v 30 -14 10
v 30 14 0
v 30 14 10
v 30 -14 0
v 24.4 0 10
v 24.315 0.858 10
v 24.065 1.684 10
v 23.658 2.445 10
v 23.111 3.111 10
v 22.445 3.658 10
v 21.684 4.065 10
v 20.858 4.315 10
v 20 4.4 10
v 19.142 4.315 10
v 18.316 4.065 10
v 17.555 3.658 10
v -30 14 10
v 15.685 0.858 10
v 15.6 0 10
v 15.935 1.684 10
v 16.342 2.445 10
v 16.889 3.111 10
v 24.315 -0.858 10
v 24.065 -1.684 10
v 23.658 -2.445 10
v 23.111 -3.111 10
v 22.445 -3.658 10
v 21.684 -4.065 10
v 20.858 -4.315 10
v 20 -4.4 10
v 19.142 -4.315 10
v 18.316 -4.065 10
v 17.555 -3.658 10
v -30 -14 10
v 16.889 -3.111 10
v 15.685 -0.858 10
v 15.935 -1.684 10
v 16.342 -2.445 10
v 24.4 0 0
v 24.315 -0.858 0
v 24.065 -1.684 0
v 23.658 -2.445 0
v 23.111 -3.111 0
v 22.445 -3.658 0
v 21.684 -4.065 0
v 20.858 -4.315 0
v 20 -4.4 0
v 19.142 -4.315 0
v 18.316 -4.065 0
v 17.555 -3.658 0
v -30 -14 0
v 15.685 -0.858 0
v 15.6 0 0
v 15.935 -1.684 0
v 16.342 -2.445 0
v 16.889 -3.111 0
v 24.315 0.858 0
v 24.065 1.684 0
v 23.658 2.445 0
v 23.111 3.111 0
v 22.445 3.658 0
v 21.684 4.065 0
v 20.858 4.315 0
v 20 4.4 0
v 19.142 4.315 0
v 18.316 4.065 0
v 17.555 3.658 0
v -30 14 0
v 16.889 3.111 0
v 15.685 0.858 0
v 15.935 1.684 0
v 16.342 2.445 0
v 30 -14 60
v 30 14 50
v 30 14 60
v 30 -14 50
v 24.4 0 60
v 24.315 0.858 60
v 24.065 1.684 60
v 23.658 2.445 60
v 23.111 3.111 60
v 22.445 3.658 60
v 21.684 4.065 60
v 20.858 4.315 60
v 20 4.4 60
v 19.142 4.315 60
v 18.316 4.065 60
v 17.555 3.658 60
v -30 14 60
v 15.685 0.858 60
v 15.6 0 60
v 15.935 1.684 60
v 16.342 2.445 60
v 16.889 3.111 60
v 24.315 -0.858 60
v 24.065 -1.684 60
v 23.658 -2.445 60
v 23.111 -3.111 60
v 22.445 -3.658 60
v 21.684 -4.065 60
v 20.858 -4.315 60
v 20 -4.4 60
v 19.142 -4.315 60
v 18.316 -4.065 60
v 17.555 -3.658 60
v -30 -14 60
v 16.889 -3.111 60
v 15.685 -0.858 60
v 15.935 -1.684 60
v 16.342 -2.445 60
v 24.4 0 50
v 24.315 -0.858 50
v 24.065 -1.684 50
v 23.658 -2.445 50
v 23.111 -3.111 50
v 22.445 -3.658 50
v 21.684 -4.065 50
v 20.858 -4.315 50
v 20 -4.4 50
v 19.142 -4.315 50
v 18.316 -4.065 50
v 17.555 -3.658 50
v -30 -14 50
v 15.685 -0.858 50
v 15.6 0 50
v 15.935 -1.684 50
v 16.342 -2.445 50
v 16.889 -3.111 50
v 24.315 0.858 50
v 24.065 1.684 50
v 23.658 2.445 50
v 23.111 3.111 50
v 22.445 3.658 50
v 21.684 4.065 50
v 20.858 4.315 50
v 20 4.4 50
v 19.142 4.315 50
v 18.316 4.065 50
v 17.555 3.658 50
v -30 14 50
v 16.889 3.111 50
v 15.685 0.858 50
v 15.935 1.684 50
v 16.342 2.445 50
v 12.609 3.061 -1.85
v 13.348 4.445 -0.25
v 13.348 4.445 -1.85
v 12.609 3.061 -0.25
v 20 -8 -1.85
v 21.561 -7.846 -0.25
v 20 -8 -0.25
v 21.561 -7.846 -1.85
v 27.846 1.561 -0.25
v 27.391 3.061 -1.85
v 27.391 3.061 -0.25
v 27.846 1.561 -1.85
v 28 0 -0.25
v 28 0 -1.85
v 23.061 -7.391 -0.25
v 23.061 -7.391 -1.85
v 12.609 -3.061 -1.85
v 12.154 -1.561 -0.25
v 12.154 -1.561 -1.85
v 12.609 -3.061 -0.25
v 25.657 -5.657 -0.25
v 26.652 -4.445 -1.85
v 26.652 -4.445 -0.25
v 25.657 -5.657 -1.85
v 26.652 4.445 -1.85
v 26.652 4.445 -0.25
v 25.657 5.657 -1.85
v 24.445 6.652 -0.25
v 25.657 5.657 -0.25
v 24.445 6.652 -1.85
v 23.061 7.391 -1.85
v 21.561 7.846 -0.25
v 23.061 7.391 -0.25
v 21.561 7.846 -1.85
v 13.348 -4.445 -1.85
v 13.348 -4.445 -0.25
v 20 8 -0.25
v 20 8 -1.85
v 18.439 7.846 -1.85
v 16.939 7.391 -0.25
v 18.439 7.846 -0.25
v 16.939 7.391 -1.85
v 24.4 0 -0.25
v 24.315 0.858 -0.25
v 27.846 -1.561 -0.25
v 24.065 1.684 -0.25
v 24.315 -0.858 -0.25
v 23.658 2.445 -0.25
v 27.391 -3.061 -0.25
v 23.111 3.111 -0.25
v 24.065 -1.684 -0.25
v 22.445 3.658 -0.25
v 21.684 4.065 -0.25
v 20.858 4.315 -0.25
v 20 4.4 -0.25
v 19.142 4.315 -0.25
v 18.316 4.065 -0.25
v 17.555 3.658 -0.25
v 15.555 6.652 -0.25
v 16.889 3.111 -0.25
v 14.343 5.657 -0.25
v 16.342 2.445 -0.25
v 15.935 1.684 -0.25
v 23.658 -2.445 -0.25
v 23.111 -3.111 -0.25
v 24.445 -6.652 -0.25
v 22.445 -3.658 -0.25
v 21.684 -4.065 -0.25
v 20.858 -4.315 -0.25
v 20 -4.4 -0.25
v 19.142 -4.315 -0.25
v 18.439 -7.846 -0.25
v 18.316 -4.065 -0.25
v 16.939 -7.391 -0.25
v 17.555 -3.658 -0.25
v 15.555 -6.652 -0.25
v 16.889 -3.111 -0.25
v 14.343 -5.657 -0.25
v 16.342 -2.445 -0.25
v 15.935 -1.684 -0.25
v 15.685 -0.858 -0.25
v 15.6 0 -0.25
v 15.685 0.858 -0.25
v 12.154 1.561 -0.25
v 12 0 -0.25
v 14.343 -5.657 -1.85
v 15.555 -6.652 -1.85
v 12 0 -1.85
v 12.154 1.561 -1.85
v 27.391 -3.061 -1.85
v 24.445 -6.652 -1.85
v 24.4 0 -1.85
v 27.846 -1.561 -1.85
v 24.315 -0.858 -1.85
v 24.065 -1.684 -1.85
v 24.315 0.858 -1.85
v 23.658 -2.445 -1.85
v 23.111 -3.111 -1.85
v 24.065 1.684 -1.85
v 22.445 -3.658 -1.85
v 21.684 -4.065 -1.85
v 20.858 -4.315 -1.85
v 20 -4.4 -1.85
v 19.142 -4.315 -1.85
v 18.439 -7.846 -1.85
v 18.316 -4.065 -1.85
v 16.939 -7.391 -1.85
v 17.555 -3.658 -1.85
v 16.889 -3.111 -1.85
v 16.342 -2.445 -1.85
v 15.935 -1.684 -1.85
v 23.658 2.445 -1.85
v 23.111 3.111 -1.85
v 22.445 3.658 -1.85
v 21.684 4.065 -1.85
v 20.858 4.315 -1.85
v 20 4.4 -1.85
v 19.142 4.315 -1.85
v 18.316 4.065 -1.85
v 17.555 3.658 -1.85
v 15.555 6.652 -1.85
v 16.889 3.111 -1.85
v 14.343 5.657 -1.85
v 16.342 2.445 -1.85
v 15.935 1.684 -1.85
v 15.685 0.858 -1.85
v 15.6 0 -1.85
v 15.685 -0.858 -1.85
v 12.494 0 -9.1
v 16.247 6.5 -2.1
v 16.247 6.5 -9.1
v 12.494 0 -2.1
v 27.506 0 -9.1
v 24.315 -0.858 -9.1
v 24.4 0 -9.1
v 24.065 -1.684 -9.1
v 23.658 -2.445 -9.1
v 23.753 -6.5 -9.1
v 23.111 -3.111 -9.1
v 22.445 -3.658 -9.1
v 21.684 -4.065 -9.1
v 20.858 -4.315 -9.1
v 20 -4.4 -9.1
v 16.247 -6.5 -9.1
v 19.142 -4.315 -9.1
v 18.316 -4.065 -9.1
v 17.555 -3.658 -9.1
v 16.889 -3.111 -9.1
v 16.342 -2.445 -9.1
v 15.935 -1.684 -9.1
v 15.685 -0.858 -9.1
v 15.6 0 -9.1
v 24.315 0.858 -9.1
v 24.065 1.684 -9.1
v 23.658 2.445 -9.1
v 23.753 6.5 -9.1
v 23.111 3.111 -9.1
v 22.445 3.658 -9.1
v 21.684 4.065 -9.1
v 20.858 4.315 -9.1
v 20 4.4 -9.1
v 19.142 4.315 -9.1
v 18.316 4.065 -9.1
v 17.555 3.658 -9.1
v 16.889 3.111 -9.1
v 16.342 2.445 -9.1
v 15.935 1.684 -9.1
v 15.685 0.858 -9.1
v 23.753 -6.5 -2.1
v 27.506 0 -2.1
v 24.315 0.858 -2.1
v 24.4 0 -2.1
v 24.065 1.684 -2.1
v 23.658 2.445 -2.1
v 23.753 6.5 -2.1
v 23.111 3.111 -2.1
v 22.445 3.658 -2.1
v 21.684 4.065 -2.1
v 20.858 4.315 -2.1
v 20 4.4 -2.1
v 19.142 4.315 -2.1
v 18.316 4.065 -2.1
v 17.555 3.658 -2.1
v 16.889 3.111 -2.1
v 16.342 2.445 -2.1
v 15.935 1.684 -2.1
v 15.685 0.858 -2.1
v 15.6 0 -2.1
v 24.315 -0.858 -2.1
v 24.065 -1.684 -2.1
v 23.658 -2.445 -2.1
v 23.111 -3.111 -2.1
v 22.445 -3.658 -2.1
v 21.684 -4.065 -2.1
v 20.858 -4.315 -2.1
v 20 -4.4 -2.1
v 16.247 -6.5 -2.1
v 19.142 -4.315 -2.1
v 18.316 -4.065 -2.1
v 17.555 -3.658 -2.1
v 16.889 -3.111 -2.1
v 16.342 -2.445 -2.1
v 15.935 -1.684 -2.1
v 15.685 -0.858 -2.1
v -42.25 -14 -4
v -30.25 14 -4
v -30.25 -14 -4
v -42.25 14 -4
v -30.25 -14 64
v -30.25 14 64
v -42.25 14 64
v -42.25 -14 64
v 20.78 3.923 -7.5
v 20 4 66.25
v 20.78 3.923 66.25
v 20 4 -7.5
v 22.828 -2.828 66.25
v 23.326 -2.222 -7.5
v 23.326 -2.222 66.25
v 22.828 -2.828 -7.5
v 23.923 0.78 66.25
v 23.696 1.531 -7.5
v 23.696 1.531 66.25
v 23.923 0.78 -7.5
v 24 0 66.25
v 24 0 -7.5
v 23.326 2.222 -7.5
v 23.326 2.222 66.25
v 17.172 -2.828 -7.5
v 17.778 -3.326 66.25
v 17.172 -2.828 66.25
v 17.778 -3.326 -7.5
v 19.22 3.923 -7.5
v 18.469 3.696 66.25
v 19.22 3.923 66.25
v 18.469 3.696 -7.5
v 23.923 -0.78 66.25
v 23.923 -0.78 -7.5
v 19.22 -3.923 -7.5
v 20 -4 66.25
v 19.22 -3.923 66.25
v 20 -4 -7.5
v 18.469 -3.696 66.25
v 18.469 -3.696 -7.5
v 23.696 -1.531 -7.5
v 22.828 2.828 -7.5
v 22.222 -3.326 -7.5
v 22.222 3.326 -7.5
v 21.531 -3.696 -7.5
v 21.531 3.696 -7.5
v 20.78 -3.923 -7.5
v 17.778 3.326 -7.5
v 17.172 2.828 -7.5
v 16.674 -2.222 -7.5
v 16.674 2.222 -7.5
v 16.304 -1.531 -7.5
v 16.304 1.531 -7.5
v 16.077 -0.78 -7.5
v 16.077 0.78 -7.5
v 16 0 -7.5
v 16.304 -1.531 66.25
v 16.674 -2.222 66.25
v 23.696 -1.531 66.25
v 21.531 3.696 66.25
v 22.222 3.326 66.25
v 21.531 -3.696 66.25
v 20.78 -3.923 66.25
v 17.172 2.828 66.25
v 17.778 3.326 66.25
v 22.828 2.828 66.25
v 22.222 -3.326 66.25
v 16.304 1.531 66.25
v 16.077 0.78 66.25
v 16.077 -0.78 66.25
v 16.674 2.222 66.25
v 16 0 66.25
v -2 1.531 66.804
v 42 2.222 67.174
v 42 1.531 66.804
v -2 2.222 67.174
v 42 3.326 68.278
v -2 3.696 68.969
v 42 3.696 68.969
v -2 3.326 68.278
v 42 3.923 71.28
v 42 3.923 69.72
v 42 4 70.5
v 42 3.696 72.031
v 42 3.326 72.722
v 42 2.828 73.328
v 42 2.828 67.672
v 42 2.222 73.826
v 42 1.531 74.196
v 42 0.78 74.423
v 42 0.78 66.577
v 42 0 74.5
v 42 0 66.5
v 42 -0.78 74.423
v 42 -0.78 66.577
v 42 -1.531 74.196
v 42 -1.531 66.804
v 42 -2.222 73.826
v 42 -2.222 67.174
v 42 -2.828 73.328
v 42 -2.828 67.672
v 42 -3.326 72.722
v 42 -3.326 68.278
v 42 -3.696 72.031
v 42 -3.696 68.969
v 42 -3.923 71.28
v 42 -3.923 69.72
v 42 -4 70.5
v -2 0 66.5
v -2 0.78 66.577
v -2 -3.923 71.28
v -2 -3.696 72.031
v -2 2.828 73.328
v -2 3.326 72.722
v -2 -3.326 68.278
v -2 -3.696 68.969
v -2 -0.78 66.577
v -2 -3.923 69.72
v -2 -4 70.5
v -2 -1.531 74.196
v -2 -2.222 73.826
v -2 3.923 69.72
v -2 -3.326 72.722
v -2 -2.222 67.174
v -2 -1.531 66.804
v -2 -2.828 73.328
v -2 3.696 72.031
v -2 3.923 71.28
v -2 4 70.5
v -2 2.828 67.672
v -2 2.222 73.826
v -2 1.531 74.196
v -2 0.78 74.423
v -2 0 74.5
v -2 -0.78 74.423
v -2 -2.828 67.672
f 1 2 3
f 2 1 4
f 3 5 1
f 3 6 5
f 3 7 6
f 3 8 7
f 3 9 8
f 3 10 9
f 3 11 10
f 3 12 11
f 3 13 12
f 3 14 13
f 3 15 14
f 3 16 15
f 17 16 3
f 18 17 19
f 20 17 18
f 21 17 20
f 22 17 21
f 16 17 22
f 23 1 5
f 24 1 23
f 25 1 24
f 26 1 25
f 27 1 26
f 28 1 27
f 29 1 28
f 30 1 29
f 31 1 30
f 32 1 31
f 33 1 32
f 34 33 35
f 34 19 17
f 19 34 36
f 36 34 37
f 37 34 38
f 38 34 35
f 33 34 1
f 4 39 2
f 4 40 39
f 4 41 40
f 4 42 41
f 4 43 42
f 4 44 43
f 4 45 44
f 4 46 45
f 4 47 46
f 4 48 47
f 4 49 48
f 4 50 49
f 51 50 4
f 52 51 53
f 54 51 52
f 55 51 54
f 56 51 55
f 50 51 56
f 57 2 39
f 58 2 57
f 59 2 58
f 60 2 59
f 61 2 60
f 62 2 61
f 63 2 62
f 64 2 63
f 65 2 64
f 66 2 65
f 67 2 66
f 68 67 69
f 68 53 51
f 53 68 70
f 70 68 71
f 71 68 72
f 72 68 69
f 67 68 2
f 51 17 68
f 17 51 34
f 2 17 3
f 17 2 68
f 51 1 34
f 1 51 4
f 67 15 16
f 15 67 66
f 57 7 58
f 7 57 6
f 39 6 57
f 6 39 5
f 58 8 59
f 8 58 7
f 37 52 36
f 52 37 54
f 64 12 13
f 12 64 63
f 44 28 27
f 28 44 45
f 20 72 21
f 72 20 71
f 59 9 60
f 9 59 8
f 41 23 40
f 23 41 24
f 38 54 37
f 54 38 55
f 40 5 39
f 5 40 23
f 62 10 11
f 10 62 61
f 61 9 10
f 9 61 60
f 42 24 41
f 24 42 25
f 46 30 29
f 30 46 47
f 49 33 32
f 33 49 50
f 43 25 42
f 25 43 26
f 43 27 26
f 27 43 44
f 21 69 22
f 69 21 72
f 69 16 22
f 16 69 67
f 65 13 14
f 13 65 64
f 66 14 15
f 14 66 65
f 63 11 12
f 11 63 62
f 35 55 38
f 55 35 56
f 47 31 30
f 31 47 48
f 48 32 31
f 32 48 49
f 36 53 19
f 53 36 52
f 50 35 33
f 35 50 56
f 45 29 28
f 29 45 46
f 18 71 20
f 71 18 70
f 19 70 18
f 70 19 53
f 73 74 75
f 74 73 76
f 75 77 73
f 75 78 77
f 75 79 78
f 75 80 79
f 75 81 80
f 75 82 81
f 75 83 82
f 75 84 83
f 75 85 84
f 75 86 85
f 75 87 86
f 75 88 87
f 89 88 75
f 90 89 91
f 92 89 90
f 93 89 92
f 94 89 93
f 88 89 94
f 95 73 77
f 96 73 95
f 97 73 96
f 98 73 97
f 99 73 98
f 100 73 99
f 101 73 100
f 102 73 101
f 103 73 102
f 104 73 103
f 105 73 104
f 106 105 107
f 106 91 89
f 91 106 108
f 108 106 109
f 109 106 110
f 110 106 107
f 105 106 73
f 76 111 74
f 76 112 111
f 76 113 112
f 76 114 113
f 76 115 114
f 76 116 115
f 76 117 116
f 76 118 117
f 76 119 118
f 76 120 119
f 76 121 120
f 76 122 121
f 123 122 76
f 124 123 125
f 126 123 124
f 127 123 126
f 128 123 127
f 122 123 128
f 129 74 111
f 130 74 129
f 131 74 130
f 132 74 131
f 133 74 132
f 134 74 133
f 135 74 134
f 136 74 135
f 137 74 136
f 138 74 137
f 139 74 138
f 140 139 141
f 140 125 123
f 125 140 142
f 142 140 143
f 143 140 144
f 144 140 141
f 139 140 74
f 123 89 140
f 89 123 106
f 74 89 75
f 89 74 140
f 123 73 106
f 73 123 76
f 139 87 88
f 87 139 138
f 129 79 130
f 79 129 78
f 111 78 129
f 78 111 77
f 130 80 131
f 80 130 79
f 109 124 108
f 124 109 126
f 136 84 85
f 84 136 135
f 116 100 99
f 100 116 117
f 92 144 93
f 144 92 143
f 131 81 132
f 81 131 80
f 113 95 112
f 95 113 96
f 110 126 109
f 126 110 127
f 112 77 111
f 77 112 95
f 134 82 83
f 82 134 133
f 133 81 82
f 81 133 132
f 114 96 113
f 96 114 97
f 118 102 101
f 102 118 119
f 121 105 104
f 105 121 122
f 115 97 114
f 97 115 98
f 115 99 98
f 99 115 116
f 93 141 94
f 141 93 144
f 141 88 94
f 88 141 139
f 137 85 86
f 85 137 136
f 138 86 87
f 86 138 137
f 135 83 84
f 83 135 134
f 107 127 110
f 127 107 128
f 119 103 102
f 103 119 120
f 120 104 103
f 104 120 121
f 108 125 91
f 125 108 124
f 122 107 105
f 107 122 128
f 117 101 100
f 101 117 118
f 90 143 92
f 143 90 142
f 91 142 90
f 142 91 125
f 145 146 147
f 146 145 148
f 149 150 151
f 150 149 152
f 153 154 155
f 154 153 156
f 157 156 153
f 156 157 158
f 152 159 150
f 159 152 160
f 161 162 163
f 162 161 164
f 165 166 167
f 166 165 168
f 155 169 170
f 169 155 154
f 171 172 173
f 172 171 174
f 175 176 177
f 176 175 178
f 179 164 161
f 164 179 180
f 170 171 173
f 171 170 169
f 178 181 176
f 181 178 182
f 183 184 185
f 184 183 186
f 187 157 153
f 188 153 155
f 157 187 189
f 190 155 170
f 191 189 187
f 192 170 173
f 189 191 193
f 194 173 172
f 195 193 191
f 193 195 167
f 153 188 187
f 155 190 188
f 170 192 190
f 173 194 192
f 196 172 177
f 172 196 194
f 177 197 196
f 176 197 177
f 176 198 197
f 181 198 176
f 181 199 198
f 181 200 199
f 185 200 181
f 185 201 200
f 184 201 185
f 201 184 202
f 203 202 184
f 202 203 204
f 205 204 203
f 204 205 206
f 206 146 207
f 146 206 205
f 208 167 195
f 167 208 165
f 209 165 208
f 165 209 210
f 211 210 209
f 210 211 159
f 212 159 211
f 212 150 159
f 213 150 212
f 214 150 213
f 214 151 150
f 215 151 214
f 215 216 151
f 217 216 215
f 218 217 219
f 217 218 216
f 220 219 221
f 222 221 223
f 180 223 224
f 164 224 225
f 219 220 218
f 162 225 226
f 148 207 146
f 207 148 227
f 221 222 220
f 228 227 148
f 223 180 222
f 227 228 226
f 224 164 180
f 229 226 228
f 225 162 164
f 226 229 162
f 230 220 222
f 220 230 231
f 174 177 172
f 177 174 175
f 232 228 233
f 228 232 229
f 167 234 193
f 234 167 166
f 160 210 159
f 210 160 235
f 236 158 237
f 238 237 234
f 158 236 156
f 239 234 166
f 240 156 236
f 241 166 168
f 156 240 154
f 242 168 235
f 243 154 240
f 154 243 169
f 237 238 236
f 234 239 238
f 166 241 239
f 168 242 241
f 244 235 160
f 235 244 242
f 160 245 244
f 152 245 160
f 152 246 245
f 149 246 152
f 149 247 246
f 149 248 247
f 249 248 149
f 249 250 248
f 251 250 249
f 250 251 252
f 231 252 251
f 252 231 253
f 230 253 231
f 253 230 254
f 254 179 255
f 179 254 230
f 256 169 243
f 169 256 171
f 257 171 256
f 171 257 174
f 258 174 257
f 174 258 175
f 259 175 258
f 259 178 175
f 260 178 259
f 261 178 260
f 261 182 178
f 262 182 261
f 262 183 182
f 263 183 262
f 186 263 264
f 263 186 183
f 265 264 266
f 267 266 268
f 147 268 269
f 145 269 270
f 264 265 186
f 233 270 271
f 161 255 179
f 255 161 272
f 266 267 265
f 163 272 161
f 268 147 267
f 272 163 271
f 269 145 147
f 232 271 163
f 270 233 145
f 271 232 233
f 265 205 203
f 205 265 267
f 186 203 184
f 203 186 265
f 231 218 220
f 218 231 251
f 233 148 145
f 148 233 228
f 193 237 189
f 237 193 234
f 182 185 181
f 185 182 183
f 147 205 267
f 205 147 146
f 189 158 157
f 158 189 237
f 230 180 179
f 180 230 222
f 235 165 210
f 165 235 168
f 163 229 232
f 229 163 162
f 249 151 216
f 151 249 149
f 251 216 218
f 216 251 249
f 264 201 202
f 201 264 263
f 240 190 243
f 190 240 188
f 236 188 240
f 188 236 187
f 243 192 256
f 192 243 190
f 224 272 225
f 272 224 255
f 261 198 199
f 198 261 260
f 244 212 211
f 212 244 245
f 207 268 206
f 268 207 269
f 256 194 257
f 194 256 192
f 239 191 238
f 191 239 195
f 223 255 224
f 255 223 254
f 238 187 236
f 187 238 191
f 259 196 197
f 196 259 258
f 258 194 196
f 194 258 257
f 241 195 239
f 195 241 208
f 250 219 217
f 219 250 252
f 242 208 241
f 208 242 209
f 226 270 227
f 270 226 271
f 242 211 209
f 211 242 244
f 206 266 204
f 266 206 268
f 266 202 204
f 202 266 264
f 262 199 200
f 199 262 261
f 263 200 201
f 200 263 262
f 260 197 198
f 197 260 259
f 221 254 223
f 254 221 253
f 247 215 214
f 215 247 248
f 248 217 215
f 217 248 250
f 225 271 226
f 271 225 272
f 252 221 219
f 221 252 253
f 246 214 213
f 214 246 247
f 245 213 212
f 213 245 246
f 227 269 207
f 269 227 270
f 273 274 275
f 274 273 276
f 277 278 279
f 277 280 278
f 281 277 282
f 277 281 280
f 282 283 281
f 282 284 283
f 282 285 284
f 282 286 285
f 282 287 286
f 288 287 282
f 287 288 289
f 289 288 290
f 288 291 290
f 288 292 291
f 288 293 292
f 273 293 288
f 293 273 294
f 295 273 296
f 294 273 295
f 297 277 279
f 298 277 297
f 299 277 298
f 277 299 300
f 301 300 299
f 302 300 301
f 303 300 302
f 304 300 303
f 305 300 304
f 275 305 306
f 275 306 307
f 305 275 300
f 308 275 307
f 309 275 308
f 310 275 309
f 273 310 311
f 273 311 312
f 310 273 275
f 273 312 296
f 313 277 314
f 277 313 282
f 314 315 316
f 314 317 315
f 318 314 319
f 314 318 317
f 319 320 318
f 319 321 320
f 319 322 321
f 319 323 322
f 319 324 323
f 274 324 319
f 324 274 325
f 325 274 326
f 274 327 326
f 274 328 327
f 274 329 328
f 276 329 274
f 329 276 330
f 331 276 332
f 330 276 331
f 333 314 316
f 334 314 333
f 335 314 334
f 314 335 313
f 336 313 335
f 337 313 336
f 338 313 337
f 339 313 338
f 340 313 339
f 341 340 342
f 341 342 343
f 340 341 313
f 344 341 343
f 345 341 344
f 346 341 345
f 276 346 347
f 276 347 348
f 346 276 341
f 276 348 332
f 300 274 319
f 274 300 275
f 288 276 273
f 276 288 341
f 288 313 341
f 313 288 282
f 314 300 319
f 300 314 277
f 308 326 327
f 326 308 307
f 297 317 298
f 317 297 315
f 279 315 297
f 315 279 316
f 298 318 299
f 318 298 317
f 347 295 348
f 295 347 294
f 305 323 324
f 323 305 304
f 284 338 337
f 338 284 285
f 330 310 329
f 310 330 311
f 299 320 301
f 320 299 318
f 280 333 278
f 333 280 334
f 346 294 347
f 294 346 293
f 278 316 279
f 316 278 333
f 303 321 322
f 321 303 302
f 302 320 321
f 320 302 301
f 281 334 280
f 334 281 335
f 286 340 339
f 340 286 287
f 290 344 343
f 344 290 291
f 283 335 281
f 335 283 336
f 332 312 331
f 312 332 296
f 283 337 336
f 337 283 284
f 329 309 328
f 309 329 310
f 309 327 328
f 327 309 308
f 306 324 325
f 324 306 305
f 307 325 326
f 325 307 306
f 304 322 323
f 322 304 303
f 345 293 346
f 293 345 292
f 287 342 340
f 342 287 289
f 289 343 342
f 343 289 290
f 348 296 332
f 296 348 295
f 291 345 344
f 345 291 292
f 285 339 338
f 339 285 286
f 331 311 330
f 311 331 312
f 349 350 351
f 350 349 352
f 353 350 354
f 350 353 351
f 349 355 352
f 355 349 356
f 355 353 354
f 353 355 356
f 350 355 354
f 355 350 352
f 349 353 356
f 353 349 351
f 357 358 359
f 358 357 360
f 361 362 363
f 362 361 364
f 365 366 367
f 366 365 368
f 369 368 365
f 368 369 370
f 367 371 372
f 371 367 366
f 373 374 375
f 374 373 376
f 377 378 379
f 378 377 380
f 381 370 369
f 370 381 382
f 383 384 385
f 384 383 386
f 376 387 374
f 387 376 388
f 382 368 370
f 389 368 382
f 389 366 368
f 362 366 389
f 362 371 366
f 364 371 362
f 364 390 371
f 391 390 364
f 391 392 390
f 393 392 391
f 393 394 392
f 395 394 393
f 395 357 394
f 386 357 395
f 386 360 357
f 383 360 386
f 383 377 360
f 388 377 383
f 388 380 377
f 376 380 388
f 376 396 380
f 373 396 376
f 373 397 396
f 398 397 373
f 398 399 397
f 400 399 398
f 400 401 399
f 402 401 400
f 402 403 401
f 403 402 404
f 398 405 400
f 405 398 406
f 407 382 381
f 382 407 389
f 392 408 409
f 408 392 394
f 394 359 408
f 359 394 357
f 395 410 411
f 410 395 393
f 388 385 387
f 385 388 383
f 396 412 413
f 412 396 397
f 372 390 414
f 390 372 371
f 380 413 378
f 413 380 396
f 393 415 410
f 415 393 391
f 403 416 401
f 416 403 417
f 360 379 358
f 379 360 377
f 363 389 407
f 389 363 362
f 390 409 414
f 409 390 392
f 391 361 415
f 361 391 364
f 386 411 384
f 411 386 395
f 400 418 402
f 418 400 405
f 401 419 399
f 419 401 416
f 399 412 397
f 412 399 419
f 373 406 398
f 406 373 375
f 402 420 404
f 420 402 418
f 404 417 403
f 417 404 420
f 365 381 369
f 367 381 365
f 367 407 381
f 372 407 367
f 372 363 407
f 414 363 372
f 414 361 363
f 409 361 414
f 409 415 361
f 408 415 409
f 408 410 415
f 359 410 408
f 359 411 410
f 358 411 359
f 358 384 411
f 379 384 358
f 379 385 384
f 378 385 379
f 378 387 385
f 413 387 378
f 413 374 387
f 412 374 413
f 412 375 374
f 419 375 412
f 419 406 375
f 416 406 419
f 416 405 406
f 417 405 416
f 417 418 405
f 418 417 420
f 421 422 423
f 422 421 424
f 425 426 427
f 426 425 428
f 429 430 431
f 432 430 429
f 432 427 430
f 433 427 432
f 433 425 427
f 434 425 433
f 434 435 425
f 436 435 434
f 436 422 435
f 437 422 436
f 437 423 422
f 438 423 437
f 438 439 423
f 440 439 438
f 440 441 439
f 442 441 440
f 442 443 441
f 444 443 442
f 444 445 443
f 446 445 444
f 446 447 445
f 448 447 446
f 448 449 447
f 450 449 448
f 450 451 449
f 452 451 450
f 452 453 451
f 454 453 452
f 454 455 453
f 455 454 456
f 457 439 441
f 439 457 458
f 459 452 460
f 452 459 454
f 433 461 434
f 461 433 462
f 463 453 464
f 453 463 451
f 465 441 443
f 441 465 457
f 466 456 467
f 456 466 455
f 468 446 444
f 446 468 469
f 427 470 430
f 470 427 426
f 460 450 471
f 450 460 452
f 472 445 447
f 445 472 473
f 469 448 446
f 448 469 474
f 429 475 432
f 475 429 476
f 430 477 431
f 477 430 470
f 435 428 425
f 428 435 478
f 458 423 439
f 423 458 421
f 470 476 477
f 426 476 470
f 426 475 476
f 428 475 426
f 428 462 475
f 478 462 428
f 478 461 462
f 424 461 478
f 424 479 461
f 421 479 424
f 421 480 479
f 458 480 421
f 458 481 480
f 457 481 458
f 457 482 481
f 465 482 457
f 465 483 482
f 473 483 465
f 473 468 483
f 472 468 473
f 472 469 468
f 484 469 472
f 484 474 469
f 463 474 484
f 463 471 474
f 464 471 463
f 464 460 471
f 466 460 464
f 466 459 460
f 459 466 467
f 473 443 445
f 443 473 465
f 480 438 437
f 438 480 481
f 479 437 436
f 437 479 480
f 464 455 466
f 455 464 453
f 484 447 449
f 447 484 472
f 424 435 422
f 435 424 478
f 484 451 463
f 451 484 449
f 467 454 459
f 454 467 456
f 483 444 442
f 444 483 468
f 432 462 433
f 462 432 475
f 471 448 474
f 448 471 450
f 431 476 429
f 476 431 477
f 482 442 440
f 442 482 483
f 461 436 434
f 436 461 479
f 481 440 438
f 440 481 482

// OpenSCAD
$fn = 32;

// ------------------------------------------------------------------------
// C clamp: throat 50 mm, screw d8
// Every part is its own module, assembly() places every instance.
// ------------------------------------------------------------------------

// --- part 1 ---
module clamp_arm() {
  difference() {
    translate([-30, -14, 0]) cube([60, 28, 10]);
    translate([20, 0, -1]) cylinder(h = 12, d = 8.8);
  }
}

// --- part 2 ---
module clamp_spine() {
  difference() {
    translate([-34, -14, 0]) cube([68, 28, 12]);
  }
}

// --- part 3 ---
module clamp_screw() {
  translate([0, 0, -36.875]) cylinder(h = 73.75, d = 8);
}

// --- part 4 ---
module clamp_washer() {
  difference() {
      translate([0, 0, 0]) cylinder(h = 1.6, d = 16);
      translate([0, 0, -1]) cylinder(h = 3.6, d = 8.8);
    }
}

// --- part 5 ---
module clamp_nut() {
  difference() {
    linear_extrude(height = 7) polygon(points = [[7.506, 0], [3.753, 6.5], [-3.753, 6.5], [-7.506, 0], [-3.753, -6.5], [3.753, -6.5]]);
    translate([0, 0, -1]) cylinder(h = 9, d = 8.8);
  }
}

// --- part 6 ---
module tommy_bar() {
  translate([0, 0, -22]) cylinder(h = 44, d = 8);
}

// --- assembly ---
module assembly() {
  color([0.80, 0.24, 0.20]) translate([0, 0, 0]) rotate([0, 0, 0]) clamp_arm();
  color([0.20, 0.45, 0.75]) translate([0, 0, 50]) rotate([0, 0, 0]) clamp_arm();
  color([0.25, 0.62, 0.32]) translate([-42.25, 0, 30]) rotate([0, 90, 0]) clamp_spine();
  color([0.92, 0.70, 0.18]) translate([20, 0, 29.375]) rotate([0, 0, 0]) clamp_screw();
  color([0.58, 0.35, 0.70]) translate([20, 0, -1.85]) rotate([0, 0, 0]) clamp_washer();
  color([0.16, 0.66, 0.66]) translate([20, 0, -9.1]) rotate([0, 0, 0]) clamp_nut();
  color([0.85, 0.48, 0.18]) translate([20, 0, 70.5]) rotate([0, 90, 0]) tommy_bar();
}

assembly();
